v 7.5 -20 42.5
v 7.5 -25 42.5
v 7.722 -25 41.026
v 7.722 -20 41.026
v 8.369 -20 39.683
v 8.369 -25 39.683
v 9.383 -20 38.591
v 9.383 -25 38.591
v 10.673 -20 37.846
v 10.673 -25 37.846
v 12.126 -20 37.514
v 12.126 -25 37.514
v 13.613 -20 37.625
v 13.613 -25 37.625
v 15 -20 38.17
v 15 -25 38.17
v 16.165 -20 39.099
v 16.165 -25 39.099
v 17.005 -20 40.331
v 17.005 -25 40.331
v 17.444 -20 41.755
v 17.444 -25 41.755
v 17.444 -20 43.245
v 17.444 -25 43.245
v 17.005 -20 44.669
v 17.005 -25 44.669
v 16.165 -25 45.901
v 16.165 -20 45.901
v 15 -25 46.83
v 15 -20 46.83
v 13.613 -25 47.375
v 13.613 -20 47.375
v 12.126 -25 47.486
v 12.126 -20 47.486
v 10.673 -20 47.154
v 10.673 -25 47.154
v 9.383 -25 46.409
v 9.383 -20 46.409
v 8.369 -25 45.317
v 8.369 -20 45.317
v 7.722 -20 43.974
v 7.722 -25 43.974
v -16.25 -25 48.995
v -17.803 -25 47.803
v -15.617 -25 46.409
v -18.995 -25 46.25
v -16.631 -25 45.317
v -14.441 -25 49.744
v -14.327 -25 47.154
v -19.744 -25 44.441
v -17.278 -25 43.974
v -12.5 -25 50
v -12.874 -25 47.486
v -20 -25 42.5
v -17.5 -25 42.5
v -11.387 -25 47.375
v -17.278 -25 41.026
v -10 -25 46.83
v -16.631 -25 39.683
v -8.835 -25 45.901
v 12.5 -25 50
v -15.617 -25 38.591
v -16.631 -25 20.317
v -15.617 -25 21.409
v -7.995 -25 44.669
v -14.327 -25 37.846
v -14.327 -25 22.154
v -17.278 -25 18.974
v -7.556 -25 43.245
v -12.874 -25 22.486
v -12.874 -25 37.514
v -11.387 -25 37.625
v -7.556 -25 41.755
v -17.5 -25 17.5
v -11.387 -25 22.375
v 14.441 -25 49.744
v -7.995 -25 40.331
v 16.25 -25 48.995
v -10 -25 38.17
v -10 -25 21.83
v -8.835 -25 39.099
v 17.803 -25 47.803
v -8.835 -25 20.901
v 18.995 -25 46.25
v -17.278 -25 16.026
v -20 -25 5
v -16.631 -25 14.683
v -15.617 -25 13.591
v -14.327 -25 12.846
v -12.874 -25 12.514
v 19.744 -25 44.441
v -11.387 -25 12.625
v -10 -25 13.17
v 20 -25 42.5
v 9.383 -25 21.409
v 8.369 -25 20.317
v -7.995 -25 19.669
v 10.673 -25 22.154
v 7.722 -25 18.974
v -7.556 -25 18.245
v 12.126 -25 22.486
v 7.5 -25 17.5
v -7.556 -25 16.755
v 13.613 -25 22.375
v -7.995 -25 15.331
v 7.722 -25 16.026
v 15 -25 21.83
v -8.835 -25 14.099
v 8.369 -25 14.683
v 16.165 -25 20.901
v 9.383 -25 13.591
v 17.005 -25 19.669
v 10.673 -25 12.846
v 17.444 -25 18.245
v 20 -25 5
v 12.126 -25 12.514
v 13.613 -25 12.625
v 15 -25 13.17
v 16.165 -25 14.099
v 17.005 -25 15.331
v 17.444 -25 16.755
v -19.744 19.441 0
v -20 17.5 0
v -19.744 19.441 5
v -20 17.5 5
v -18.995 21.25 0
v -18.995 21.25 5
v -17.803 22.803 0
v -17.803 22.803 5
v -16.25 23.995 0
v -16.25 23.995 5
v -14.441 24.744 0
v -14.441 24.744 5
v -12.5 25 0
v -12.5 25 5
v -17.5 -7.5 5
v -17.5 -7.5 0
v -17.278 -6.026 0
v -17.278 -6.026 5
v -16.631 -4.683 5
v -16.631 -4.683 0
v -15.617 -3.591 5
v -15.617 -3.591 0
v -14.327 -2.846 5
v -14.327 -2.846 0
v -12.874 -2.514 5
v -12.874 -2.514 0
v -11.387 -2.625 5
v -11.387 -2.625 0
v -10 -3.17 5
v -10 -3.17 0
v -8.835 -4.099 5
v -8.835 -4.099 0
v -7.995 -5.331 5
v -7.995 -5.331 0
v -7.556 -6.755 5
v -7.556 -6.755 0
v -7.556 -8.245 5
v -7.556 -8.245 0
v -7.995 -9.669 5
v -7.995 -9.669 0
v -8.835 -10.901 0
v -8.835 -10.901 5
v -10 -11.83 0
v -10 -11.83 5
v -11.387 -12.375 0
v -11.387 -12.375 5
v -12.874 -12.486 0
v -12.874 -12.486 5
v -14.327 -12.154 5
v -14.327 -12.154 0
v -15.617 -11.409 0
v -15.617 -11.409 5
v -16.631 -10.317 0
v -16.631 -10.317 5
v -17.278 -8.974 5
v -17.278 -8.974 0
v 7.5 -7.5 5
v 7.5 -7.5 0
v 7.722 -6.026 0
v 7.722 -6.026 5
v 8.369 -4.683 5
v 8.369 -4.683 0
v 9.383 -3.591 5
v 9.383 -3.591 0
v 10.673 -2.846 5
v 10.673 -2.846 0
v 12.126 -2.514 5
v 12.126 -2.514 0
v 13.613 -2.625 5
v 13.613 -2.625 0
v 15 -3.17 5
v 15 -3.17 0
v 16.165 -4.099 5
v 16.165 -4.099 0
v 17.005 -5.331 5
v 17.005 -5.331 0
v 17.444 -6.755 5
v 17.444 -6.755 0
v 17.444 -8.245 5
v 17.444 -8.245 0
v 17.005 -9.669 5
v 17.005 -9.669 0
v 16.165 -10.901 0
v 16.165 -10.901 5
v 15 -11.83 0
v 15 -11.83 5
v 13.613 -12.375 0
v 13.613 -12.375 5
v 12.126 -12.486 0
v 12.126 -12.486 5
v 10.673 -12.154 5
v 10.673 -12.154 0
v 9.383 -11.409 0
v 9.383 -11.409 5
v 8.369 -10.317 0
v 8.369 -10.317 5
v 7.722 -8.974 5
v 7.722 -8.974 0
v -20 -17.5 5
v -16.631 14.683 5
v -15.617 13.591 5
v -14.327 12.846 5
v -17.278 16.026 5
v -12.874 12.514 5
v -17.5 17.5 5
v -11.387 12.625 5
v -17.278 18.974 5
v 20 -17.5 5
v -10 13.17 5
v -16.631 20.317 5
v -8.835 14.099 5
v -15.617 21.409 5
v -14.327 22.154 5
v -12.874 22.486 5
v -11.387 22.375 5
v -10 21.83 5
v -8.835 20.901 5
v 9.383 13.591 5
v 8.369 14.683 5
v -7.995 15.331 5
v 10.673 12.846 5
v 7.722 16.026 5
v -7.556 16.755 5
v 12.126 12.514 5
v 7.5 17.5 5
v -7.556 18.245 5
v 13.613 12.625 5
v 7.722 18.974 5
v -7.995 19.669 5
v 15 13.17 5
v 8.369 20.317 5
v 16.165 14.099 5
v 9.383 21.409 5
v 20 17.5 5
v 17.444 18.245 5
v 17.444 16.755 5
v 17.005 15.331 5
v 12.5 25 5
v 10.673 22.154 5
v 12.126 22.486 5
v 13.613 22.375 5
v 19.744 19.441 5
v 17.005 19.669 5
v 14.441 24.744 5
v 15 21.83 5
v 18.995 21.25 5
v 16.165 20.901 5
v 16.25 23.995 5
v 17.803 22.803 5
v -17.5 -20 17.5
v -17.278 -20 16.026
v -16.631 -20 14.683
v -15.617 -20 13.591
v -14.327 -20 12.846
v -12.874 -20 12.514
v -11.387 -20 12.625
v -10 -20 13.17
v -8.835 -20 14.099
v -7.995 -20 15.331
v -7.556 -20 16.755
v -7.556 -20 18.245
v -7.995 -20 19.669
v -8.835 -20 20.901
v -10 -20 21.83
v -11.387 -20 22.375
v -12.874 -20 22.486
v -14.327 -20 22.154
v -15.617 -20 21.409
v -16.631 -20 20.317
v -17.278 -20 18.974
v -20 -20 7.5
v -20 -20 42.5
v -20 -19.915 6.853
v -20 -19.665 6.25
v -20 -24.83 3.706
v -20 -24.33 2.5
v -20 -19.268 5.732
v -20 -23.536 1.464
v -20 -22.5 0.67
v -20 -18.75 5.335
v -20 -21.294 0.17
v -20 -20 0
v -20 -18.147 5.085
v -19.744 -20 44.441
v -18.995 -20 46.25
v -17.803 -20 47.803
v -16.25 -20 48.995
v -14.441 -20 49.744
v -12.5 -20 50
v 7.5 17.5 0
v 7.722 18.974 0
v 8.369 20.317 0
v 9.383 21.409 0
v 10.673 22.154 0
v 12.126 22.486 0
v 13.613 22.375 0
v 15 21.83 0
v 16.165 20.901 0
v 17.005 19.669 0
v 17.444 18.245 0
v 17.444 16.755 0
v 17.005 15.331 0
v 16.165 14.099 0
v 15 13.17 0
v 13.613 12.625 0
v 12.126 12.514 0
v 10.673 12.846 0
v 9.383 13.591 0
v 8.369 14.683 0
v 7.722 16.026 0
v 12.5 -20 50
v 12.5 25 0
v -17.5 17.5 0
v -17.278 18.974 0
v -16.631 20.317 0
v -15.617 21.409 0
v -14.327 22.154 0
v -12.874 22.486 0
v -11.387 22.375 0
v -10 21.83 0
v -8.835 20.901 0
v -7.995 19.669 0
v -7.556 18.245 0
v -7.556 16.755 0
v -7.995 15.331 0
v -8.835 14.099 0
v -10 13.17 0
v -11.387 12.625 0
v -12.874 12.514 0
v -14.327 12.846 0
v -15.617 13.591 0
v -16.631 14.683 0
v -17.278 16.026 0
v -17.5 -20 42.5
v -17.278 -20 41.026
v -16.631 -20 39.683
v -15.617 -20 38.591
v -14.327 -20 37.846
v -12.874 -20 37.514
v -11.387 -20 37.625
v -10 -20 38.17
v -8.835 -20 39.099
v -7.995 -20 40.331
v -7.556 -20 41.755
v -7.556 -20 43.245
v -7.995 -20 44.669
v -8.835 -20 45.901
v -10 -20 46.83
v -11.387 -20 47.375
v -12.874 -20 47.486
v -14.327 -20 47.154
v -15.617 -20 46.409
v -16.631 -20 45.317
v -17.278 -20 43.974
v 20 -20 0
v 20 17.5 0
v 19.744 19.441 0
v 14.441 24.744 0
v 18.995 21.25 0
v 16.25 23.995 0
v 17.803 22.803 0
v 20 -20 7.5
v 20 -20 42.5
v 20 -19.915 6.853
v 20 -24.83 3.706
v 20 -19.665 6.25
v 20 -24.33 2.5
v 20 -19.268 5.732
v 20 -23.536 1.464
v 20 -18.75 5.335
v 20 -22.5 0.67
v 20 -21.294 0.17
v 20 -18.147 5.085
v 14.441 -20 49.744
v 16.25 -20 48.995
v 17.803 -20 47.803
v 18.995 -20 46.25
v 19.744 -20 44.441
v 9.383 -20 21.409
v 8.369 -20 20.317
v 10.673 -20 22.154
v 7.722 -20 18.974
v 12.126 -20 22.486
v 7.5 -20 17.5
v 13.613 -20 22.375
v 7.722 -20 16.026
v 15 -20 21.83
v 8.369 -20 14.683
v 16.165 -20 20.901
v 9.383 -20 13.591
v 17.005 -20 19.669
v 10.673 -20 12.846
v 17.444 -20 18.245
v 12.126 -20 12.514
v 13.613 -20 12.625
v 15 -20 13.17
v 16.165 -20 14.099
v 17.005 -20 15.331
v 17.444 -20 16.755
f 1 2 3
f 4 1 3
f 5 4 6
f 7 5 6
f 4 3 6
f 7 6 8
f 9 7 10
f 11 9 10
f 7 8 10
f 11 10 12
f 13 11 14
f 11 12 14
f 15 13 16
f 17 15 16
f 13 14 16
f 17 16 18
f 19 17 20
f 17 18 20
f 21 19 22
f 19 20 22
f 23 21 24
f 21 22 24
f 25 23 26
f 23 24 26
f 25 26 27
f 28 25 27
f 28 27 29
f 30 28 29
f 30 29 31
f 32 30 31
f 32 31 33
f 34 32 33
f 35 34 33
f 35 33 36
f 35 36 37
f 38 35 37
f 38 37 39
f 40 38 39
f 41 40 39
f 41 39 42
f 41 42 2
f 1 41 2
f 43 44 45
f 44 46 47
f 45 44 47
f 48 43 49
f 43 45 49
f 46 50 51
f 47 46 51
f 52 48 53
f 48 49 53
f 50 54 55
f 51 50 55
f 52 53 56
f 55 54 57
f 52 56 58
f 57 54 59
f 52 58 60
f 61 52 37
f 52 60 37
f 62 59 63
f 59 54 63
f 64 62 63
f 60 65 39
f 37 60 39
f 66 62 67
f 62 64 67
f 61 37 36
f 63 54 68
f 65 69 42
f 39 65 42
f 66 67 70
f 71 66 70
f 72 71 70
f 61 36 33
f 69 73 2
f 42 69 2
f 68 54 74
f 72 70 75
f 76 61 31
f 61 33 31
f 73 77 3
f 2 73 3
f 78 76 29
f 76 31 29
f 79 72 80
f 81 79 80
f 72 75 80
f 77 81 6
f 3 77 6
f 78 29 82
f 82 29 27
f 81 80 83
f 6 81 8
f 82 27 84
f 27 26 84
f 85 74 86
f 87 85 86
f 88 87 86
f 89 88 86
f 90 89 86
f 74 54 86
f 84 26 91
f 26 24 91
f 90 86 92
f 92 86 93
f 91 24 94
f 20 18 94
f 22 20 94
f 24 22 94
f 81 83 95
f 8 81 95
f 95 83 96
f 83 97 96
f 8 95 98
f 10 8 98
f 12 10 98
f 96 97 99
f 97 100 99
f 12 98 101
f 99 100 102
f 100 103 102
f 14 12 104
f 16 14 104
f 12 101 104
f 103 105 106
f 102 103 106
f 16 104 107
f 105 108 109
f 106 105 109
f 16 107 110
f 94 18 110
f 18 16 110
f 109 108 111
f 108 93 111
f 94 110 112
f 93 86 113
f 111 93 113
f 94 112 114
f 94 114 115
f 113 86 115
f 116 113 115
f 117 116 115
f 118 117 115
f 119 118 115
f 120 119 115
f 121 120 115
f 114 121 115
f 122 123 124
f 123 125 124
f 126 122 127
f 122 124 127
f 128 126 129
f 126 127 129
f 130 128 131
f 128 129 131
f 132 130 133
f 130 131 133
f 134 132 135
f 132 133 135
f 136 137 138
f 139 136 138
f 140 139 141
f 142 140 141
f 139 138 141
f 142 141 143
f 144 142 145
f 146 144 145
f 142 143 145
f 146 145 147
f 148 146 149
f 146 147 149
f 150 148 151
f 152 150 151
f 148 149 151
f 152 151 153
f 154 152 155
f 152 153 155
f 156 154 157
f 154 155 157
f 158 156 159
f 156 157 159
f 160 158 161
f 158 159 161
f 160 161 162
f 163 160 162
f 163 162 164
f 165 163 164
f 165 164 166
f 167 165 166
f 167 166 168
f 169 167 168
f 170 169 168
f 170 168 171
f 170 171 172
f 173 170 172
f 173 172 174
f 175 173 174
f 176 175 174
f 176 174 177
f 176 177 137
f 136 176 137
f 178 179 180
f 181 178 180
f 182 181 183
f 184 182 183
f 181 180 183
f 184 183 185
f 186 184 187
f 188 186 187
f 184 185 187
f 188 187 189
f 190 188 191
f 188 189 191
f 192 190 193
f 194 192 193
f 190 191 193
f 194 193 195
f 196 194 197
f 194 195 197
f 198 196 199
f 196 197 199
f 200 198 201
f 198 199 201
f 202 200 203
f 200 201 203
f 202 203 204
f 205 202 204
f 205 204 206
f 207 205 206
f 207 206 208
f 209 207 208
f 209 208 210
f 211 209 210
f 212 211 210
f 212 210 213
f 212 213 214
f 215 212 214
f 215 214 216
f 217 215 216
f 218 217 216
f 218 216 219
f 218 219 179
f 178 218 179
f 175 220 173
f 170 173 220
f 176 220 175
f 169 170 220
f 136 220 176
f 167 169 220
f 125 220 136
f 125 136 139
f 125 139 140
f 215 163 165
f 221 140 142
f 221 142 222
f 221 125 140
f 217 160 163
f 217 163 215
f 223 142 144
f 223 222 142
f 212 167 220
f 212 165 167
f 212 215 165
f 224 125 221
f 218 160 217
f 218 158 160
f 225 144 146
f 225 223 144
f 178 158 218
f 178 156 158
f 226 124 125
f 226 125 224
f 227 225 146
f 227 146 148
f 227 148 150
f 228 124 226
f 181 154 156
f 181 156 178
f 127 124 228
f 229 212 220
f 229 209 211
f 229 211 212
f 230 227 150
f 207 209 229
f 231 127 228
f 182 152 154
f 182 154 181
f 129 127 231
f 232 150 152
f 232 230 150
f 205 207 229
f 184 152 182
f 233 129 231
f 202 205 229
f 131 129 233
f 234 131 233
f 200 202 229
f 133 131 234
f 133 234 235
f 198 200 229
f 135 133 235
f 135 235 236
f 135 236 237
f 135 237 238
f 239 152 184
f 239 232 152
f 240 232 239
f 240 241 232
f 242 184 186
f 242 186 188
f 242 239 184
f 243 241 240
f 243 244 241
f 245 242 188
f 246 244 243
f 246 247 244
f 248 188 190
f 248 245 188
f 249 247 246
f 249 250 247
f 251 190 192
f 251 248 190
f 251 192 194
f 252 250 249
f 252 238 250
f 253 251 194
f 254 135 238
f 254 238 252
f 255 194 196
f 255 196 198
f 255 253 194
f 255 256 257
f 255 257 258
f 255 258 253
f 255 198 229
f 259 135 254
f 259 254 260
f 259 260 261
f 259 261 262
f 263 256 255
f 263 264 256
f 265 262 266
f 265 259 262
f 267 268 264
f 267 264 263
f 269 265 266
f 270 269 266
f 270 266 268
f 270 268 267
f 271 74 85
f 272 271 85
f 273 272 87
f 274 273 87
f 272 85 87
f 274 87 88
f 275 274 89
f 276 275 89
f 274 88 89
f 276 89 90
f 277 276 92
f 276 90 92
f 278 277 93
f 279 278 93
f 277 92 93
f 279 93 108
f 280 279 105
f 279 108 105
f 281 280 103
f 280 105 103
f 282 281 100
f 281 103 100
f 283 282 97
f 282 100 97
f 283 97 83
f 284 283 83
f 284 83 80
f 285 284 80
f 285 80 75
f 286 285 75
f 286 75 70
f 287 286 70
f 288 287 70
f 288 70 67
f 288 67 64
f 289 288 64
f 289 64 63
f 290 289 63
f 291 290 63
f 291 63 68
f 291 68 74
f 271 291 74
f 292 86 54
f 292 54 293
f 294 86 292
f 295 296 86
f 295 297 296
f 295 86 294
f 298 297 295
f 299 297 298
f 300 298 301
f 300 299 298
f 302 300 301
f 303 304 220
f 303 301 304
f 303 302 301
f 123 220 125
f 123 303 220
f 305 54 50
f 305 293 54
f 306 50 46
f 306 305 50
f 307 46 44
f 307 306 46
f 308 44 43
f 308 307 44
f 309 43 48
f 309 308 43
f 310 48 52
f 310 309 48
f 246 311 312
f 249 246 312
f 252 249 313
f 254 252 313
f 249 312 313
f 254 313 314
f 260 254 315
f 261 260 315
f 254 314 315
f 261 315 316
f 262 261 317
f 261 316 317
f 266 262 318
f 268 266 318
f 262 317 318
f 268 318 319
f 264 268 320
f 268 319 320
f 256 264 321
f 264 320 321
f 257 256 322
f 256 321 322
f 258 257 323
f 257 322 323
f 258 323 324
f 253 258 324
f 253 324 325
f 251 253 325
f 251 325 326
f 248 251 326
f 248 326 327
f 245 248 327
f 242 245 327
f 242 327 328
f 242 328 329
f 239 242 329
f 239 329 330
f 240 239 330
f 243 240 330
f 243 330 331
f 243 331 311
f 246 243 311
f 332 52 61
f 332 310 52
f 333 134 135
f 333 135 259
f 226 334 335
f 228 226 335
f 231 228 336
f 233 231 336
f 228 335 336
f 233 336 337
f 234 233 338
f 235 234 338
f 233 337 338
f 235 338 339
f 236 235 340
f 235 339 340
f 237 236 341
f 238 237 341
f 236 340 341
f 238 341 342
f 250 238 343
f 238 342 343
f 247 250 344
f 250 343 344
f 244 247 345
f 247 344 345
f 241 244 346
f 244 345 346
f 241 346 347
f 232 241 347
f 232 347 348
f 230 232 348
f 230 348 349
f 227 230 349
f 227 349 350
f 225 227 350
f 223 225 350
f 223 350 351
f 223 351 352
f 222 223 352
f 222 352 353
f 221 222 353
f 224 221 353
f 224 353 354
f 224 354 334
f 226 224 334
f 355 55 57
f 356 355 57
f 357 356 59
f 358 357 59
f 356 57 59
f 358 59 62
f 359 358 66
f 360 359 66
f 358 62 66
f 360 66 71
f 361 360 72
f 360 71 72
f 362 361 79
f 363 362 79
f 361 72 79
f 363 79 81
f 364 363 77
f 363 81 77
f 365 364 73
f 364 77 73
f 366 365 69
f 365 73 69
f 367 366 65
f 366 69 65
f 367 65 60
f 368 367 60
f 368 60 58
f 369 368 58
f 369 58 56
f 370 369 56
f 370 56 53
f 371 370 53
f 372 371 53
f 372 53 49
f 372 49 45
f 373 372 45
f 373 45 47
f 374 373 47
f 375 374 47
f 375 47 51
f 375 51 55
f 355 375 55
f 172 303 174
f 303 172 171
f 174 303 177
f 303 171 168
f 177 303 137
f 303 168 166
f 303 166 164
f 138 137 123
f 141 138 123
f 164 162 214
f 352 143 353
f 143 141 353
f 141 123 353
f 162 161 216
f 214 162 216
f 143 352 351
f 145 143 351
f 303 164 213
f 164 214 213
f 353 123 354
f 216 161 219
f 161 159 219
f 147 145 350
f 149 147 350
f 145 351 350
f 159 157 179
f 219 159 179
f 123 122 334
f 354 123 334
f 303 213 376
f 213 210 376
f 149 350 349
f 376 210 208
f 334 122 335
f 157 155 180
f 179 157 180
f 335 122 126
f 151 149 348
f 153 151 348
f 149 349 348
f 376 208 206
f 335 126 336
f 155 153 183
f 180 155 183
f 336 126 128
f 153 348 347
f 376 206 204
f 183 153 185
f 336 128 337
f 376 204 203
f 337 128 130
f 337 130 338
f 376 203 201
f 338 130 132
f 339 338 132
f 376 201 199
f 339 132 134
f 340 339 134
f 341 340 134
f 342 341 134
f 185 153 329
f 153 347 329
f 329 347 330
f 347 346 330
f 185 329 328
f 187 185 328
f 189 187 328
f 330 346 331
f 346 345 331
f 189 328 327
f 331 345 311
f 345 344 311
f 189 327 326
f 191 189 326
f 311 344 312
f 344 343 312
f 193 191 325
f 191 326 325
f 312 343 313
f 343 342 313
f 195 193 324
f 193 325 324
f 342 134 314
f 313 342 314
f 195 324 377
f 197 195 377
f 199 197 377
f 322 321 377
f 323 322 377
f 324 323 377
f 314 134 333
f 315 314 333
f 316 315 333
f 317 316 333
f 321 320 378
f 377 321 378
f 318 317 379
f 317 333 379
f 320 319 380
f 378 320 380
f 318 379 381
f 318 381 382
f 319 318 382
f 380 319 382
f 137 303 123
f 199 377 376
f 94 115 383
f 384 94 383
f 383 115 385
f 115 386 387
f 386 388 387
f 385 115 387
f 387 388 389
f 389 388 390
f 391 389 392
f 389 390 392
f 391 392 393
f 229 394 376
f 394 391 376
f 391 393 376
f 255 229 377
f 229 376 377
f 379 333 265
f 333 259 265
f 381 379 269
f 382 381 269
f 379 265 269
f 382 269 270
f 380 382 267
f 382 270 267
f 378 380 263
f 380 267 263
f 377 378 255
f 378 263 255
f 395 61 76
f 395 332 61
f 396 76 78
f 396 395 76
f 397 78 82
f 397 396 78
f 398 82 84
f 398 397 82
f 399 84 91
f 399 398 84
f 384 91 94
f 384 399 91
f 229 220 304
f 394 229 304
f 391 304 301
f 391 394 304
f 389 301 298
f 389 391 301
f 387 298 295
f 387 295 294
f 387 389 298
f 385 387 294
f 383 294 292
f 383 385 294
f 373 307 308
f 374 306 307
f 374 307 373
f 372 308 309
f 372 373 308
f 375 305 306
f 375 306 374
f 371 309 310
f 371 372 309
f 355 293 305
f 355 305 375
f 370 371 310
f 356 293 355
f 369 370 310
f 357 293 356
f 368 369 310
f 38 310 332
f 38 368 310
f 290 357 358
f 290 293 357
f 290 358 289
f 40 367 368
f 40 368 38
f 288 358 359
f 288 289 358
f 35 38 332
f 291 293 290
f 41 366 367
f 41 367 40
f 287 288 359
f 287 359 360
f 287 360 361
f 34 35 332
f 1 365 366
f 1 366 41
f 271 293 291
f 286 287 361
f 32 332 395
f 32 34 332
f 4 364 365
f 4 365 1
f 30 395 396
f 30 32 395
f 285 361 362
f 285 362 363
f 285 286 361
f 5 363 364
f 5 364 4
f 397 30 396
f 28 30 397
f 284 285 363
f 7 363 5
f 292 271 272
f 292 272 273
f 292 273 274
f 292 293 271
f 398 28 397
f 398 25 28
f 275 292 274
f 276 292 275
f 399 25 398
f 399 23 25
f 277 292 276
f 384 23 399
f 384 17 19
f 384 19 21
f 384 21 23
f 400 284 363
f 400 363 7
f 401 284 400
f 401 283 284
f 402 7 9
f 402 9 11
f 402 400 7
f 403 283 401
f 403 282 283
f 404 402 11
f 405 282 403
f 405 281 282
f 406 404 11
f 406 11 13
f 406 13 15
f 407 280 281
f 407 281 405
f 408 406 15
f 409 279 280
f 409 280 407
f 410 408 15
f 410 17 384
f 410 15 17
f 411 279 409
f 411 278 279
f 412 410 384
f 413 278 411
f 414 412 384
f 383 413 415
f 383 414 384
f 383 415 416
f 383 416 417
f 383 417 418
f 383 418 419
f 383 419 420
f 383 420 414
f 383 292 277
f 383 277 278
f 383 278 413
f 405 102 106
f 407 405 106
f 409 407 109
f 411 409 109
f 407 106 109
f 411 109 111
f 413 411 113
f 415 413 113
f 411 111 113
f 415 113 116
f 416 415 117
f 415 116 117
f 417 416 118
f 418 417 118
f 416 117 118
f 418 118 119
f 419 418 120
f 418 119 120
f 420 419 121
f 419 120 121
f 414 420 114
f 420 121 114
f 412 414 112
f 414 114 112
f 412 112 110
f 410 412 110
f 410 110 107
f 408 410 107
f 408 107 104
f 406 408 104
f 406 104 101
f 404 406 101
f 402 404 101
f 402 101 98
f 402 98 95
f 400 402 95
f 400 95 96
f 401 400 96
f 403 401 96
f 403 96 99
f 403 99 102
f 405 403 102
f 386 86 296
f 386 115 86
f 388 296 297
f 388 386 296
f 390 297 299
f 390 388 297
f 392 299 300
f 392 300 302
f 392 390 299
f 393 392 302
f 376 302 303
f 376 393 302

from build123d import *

# Parameters (mm, degrees)
SKETCH_6_W      = 40
SKETCH_6_H      = 50
EXTRUDE_7_DEPTH = 5
SKETCH_12_W     = 40
SKETCH_12_H     = 5
EXTRUDE_8_DEPTH = 45
FILLET_9_R      = 2.5
FILLET_10_R     = 5
MM_2_D          = 10
FILLET_11_R     = 7.5
MM_3_D          = 10


with BuildPart() as part:
    # 草图6 → 凸台-拉伸7 (new body)
    with BuildSketch(Plane.XY):
        Rectangle(SKETCH_6_W, SKETCH_6_H)
    extrude(amount=EXTRUDE_7_DEPTH)

    # 草图12 → 凸台-拉伸8 (add)
    with BuildSketch(Plane.XY.offset(5)):
        with Locations((0, -22.5)):
            Rectangle(SKETCH_12_W, SKETCH_12_H)
    extrude(amount=EXTRUDE_8_DEPTH)

    # 圆角9
    fillet_9_edges = [part.edges().sort_by_distance(p)[0] for p in [
        (0, -20, 5),
    ]]
    fillet(fillet_9_edges, radius=FILLET_9_R)

    # 圆角10
    fillet_10_edges = [part.edges().sort_by_distance(p)[0] for p in [
        (0, -25, 0),
    ]]
    fillet(fillet_10_edges, radius=FILLET_10_R)

    # 大小mm 暗销孔2 (through all)
    with Locations(Plane.XY.offset(5)):
        with Locations((-12.5, 17.5), (-12.5, -7.5), (12.5, -7.5), (12.5, 17.5)):
            Hole(MM_2_D / 2)

    # 圆角11
    fillet_11_edges = [part.edges().sort_by_distance(p)[0] for p in [
        (-20, -22.5, 50),
        (20, -22.5, 50),
        (-20, 25, 2.5),
        (20, 25, 2.5),
    ]]
    fillet(fillet_11_edges, radius=FILLET_11_R)

    # 大小mm 暗销孔3 (through all)
    with Locations(Plane(origin=(0, -20, 0), x_dir=(1, 0, 0), z_dir=(0, 1, 0))):
        with Locations((-12.5, -17.5), (12.5, -17.5), (12.5, -42.5), (-12.5, -42.5)):
            Hole(MM_3_D / 2)


solid = part.part
